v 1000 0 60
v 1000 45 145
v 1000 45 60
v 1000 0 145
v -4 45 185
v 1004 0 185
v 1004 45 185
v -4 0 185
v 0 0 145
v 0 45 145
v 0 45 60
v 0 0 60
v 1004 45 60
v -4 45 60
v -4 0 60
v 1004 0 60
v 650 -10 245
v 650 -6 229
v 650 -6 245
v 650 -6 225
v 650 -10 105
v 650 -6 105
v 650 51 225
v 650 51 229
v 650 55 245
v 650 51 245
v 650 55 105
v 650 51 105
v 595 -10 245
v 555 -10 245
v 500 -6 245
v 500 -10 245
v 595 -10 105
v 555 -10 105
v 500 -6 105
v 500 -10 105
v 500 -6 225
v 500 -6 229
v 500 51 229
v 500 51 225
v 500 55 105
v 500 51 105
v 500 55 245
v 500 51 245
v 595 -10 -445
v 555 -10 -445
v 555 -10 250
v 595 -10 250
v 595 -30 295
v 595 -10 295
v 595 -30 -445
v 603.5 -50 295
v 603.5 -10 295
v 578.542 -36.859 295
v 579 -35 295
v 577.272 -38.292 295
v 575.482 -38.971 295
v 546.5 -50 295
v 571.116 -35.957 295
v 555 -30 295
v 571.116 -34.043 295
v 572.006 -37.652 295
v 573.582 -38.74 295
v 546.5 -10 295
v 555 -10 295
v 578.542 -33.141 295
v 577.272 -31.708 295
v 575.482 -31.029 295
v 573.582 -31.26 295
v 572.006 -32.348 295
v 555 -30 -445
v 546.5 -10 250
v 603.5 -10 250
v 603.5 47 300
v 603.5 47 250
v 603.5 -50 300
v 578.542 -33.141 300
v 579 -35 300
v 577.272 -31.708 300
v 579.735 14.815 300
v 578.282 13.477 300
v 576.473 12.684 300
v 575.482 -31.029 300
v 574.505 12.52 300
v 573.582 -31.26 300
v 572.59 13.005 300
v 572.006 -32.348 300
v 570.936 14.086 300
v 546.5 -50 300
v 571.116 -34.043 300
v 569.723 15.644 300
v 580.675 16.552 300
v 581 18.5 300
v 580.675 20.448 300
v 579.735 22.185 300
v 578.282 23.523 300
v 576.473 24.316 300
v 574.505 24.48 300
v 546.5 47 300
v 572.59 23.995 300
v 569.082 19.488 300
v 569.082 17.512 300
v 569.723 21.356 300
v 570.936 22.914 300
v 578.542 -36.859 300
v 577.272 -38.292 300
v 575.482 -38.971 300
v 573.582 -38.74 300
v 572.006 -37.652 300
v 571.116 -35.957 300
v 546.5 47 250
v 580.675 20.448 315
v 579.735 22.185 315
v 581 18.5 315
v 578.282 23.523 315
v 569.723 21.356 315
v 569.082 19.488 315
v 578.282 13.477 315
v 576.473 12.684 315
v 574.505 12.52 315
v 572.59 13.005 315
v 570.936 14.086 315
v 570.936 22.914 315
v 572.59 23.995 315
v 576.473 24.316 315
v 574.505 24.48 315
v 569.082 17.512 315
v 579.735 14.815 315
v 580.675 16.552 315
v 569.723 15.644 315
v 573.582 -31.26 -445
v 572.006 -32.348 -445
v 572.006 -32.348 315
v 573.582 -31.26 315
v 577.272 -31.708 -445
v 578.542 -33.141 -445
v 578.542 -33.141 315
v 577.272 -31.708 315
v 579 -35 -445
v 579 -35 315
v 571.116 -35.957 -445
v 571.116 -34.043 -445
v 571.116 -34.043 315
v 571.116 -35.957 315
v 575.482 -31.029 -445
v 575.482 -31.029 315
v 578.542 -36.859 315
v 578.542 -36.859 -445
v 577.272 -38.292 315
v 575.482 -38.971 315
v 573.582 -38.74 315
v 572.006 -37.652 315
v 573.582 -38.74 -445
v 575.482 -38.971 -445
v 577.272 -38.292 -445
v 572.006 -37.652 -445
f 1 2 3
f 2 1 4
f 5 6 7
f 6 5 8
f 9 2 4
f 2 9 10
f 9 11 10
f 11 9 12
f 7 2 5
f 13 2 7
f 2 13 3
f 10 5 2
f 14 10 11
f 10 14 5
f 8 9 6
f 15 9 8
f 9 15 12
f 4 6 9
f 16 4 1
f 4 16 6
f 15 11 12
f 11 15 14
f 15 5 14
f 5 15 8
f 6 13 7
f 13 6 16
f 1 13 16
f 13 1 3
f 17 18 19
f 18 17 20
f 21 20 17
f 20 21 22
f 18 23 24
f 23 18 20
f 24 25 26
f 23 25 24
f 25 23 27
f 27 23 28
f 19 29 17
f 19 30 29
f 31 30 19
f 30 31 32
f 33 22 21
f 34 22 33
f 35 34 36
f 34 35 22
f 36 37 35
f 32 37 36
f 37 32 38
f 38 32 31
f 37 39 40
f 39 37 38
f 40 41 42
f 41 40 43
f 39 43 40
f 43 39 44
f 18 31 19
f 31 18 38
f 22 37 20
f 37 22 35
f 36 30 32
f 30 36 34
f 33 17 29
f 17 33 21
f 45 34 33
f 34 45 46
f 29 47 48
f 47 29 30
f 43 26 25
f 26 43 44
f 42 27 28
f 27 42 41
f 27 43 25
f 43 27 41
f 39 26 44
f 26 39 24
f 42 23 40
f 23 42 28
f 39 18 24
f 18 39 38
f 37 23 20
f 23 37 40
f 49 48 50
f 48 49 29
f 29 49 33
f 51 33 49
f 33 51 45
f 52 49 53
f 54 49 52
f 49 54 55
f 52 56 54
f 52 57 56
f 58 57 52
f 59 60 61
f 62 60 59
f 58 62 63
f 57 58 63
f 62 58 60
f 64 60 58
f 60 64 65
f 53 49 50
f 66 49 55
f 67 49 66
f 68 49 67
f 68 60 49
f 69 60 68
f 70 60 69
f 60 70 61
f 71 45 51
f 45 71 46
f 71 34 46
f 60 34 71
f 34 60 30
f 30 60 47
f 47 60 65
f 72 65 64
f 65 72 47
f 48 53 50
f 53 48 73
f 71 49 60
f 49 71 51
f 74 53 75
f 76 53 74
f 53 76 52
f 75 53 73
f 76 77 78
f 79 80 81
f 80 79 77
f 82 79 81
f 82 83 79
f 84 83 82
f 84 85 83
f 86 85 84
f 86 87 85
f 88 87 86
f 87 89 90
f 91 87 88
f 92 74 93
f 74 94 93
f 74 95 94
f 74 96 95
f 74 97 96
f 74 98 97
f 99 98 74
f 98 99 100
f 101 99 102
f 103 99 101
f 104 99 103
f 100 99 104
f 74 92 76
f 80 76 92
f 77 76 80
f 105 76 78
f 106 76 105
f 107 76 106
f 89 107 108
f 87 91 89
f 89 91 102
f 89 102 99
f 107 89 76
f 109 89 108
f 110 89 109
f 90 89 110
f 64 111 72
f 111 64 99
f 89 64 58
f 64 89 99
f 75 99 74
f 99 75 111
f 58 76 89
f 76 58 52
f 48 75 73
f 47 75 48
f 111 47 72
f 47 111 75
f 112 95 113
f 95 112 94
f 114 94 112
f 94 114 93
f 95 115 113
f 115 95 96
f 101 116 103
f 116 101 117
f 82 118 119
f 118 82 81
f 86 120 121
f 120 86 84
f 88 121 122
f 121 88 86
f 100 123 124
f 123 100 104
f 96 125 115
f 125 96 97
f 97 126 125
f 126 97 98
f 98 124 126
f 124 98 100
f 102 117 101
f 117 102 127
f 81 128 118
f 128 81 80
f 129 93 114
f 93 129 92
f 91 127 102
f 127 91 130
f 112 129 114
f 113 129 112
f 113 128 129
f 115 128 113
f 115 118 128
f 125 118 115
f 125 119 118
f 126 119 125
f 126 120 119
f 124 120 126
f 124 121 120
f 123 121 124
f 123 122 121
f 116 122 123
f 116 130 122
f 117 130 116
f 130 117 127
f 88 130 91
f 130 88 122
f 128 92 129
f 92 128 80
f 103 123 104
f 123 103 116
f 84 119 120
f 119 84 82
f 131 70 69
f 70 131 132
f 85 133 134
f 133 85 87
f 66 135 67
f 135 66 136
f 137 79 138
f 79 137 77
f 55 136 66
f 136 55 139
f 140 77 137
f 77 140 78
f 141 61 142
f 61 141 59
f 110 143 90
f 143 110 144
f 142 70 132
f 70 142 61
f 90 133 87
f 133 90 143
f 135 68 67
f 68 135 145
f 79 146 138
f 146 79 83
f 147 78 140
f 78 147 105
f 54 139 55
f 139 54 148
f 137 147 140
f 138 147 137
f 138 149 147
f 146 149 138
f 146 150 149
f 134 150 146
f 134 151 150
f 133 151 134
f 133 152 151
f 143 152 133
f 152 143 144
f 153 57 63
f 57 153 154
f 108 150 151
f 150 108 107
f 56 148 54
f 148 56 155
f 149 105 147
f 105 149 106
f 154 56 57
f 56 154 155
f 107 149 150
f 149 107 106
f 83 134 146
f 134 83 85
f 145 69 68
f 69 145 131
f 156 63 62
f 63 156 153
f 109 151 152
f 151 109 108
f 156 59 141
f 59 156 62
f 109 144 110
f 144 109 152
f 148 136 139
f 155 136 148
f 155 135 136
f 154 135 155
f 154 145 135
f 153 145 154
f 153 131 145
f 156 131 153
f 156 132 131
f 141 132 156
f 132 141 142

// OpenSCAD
// file: xcarve-vwheel.scad
module vwheel(spacer)
{
        color("grey") {
                translate([0, 0, 10]) cylinder(r=12, h=10);
                cylinder(r=5, h=spacer);
        }
}
// file: ../Common/nema.scad
module nema_motor(w, d, length)
{
        color("black") {
                translate([-w/2, -w/2, 0])
                        cube([w, w, length]);
        }
        color("lightgray") {
                cylinder(r=d, h=length+20);
        }
}

module nema23_motor(length)
{
        nema_motor(57, 6, length);
}

function nema34_dim() = 85.85;

module nema34_motor(length)
{
        nema_motor(nema34_dim(), 7, length);
}

function nema42_dim() = 110;

module nema42_motor(length)
{
        nema_motor(110, 8.5, length);
}

module nema23_phidget_3332_0()
{
        color("black") {
                translate([-57/2, -57/2, 48+28])
                        cube([57, 57, 56]);
                translate([0, 0, 28])
                    cylinder(r=26, h=48);
        }
        color("lightgray") {
                cylinder(r=6, h=26);
                translate([0, 0, 26])
                    cylinder(r=16, h=2);
        }        
}
// file: xcarve-z-carriage.scad
use <xcarve-vwheel.scad>

module weedingtool(length)
{
        color("yellow") {
                translate([-50, -100, -50])
                cube([100, 100, 100]);
        }
        color("grey") {
                translate([0, -50, -length-50])
                cylinder(r=16, h=length);
        }
}

module z_carriage(height, tool_length, invert)
{
        translate([70, 0, 70]) 
                rotate([0, invert? 180 : 0, 0])
                weedingtool(tool_length);
        color("black") {
                cube([140, 4, 140]);
        }
        translate([40, 4, 20]) 
                rotate([-90, 0, 0])
                vwheel(10);
        translate([40, 4, 120]) 
                rotate([-90, 0, 0])
                vwheel(10);
        translate([140-40, 4, 20]) 
                rotate([-90, 0, 0])
                vwheel(10);
        translate([140-40, 4, 120]) 
                rotate([-90, 0, 0])
                vwheel(10);
}

z_carriage(600, 600);
// file: xcarve-x-carriage.scad
use <xcarve-z-carriage.scad>
use <../Common/nema.scad>

module leadscrew(length)
{
        color("lightgray") {
                cylinder(r=4, h=length);
        }
}

module x_carriage(height, tool_length, z, invert)
{
        color("black") {
                // plates
                translate([0, 0, 0]) cube([150, 4, 140]);
                translate([0, 61, 0]) cube([150, 4, 140]);
                translate([0, 0, 120]) cube([150, 65, 4]);
        }

        translate([0, 0, 50]) {
                color("black") {
                        // z-axis makeslide 
                        translate([55, -20, -height])
                                cube([40, 20, height+140]);

                        // motor plate
                        translate([(150-57)/2, -40, 140])
                                cube([57, 97, 5]);
                }
                translate([75, -25, -height]) 
                        leadscrew(height+140+20);

                translate([57/2+(150-57)/2, 57/2, 140-45])
                        nema23_motor(45);
                *translate([5, -35, -z])
                        z_carriage(height, tool_length, invert);
        }
        
}

x_carriage(600, 200, 0, 0);
// main file
use <xcarve-x-carriage.scad>

module gantry(length, width, height, tool_length, x, z, invert)
{
        color("black") {
                // x-rail
                translate([0, 0, 145]) cube([length, 45, 40]);
                // plates
                translate([-4, 0, 60]) cube([4, 45, 125]);
                translate([width, 0, 60]) cube([4, 45, 125]);
        }
        translate([x, -10, 145-40])
                x_carriage(height, tool_length, z, invert);
}

gantry(1000, 1000, 600, 600, 500, 500, 400, 1);
